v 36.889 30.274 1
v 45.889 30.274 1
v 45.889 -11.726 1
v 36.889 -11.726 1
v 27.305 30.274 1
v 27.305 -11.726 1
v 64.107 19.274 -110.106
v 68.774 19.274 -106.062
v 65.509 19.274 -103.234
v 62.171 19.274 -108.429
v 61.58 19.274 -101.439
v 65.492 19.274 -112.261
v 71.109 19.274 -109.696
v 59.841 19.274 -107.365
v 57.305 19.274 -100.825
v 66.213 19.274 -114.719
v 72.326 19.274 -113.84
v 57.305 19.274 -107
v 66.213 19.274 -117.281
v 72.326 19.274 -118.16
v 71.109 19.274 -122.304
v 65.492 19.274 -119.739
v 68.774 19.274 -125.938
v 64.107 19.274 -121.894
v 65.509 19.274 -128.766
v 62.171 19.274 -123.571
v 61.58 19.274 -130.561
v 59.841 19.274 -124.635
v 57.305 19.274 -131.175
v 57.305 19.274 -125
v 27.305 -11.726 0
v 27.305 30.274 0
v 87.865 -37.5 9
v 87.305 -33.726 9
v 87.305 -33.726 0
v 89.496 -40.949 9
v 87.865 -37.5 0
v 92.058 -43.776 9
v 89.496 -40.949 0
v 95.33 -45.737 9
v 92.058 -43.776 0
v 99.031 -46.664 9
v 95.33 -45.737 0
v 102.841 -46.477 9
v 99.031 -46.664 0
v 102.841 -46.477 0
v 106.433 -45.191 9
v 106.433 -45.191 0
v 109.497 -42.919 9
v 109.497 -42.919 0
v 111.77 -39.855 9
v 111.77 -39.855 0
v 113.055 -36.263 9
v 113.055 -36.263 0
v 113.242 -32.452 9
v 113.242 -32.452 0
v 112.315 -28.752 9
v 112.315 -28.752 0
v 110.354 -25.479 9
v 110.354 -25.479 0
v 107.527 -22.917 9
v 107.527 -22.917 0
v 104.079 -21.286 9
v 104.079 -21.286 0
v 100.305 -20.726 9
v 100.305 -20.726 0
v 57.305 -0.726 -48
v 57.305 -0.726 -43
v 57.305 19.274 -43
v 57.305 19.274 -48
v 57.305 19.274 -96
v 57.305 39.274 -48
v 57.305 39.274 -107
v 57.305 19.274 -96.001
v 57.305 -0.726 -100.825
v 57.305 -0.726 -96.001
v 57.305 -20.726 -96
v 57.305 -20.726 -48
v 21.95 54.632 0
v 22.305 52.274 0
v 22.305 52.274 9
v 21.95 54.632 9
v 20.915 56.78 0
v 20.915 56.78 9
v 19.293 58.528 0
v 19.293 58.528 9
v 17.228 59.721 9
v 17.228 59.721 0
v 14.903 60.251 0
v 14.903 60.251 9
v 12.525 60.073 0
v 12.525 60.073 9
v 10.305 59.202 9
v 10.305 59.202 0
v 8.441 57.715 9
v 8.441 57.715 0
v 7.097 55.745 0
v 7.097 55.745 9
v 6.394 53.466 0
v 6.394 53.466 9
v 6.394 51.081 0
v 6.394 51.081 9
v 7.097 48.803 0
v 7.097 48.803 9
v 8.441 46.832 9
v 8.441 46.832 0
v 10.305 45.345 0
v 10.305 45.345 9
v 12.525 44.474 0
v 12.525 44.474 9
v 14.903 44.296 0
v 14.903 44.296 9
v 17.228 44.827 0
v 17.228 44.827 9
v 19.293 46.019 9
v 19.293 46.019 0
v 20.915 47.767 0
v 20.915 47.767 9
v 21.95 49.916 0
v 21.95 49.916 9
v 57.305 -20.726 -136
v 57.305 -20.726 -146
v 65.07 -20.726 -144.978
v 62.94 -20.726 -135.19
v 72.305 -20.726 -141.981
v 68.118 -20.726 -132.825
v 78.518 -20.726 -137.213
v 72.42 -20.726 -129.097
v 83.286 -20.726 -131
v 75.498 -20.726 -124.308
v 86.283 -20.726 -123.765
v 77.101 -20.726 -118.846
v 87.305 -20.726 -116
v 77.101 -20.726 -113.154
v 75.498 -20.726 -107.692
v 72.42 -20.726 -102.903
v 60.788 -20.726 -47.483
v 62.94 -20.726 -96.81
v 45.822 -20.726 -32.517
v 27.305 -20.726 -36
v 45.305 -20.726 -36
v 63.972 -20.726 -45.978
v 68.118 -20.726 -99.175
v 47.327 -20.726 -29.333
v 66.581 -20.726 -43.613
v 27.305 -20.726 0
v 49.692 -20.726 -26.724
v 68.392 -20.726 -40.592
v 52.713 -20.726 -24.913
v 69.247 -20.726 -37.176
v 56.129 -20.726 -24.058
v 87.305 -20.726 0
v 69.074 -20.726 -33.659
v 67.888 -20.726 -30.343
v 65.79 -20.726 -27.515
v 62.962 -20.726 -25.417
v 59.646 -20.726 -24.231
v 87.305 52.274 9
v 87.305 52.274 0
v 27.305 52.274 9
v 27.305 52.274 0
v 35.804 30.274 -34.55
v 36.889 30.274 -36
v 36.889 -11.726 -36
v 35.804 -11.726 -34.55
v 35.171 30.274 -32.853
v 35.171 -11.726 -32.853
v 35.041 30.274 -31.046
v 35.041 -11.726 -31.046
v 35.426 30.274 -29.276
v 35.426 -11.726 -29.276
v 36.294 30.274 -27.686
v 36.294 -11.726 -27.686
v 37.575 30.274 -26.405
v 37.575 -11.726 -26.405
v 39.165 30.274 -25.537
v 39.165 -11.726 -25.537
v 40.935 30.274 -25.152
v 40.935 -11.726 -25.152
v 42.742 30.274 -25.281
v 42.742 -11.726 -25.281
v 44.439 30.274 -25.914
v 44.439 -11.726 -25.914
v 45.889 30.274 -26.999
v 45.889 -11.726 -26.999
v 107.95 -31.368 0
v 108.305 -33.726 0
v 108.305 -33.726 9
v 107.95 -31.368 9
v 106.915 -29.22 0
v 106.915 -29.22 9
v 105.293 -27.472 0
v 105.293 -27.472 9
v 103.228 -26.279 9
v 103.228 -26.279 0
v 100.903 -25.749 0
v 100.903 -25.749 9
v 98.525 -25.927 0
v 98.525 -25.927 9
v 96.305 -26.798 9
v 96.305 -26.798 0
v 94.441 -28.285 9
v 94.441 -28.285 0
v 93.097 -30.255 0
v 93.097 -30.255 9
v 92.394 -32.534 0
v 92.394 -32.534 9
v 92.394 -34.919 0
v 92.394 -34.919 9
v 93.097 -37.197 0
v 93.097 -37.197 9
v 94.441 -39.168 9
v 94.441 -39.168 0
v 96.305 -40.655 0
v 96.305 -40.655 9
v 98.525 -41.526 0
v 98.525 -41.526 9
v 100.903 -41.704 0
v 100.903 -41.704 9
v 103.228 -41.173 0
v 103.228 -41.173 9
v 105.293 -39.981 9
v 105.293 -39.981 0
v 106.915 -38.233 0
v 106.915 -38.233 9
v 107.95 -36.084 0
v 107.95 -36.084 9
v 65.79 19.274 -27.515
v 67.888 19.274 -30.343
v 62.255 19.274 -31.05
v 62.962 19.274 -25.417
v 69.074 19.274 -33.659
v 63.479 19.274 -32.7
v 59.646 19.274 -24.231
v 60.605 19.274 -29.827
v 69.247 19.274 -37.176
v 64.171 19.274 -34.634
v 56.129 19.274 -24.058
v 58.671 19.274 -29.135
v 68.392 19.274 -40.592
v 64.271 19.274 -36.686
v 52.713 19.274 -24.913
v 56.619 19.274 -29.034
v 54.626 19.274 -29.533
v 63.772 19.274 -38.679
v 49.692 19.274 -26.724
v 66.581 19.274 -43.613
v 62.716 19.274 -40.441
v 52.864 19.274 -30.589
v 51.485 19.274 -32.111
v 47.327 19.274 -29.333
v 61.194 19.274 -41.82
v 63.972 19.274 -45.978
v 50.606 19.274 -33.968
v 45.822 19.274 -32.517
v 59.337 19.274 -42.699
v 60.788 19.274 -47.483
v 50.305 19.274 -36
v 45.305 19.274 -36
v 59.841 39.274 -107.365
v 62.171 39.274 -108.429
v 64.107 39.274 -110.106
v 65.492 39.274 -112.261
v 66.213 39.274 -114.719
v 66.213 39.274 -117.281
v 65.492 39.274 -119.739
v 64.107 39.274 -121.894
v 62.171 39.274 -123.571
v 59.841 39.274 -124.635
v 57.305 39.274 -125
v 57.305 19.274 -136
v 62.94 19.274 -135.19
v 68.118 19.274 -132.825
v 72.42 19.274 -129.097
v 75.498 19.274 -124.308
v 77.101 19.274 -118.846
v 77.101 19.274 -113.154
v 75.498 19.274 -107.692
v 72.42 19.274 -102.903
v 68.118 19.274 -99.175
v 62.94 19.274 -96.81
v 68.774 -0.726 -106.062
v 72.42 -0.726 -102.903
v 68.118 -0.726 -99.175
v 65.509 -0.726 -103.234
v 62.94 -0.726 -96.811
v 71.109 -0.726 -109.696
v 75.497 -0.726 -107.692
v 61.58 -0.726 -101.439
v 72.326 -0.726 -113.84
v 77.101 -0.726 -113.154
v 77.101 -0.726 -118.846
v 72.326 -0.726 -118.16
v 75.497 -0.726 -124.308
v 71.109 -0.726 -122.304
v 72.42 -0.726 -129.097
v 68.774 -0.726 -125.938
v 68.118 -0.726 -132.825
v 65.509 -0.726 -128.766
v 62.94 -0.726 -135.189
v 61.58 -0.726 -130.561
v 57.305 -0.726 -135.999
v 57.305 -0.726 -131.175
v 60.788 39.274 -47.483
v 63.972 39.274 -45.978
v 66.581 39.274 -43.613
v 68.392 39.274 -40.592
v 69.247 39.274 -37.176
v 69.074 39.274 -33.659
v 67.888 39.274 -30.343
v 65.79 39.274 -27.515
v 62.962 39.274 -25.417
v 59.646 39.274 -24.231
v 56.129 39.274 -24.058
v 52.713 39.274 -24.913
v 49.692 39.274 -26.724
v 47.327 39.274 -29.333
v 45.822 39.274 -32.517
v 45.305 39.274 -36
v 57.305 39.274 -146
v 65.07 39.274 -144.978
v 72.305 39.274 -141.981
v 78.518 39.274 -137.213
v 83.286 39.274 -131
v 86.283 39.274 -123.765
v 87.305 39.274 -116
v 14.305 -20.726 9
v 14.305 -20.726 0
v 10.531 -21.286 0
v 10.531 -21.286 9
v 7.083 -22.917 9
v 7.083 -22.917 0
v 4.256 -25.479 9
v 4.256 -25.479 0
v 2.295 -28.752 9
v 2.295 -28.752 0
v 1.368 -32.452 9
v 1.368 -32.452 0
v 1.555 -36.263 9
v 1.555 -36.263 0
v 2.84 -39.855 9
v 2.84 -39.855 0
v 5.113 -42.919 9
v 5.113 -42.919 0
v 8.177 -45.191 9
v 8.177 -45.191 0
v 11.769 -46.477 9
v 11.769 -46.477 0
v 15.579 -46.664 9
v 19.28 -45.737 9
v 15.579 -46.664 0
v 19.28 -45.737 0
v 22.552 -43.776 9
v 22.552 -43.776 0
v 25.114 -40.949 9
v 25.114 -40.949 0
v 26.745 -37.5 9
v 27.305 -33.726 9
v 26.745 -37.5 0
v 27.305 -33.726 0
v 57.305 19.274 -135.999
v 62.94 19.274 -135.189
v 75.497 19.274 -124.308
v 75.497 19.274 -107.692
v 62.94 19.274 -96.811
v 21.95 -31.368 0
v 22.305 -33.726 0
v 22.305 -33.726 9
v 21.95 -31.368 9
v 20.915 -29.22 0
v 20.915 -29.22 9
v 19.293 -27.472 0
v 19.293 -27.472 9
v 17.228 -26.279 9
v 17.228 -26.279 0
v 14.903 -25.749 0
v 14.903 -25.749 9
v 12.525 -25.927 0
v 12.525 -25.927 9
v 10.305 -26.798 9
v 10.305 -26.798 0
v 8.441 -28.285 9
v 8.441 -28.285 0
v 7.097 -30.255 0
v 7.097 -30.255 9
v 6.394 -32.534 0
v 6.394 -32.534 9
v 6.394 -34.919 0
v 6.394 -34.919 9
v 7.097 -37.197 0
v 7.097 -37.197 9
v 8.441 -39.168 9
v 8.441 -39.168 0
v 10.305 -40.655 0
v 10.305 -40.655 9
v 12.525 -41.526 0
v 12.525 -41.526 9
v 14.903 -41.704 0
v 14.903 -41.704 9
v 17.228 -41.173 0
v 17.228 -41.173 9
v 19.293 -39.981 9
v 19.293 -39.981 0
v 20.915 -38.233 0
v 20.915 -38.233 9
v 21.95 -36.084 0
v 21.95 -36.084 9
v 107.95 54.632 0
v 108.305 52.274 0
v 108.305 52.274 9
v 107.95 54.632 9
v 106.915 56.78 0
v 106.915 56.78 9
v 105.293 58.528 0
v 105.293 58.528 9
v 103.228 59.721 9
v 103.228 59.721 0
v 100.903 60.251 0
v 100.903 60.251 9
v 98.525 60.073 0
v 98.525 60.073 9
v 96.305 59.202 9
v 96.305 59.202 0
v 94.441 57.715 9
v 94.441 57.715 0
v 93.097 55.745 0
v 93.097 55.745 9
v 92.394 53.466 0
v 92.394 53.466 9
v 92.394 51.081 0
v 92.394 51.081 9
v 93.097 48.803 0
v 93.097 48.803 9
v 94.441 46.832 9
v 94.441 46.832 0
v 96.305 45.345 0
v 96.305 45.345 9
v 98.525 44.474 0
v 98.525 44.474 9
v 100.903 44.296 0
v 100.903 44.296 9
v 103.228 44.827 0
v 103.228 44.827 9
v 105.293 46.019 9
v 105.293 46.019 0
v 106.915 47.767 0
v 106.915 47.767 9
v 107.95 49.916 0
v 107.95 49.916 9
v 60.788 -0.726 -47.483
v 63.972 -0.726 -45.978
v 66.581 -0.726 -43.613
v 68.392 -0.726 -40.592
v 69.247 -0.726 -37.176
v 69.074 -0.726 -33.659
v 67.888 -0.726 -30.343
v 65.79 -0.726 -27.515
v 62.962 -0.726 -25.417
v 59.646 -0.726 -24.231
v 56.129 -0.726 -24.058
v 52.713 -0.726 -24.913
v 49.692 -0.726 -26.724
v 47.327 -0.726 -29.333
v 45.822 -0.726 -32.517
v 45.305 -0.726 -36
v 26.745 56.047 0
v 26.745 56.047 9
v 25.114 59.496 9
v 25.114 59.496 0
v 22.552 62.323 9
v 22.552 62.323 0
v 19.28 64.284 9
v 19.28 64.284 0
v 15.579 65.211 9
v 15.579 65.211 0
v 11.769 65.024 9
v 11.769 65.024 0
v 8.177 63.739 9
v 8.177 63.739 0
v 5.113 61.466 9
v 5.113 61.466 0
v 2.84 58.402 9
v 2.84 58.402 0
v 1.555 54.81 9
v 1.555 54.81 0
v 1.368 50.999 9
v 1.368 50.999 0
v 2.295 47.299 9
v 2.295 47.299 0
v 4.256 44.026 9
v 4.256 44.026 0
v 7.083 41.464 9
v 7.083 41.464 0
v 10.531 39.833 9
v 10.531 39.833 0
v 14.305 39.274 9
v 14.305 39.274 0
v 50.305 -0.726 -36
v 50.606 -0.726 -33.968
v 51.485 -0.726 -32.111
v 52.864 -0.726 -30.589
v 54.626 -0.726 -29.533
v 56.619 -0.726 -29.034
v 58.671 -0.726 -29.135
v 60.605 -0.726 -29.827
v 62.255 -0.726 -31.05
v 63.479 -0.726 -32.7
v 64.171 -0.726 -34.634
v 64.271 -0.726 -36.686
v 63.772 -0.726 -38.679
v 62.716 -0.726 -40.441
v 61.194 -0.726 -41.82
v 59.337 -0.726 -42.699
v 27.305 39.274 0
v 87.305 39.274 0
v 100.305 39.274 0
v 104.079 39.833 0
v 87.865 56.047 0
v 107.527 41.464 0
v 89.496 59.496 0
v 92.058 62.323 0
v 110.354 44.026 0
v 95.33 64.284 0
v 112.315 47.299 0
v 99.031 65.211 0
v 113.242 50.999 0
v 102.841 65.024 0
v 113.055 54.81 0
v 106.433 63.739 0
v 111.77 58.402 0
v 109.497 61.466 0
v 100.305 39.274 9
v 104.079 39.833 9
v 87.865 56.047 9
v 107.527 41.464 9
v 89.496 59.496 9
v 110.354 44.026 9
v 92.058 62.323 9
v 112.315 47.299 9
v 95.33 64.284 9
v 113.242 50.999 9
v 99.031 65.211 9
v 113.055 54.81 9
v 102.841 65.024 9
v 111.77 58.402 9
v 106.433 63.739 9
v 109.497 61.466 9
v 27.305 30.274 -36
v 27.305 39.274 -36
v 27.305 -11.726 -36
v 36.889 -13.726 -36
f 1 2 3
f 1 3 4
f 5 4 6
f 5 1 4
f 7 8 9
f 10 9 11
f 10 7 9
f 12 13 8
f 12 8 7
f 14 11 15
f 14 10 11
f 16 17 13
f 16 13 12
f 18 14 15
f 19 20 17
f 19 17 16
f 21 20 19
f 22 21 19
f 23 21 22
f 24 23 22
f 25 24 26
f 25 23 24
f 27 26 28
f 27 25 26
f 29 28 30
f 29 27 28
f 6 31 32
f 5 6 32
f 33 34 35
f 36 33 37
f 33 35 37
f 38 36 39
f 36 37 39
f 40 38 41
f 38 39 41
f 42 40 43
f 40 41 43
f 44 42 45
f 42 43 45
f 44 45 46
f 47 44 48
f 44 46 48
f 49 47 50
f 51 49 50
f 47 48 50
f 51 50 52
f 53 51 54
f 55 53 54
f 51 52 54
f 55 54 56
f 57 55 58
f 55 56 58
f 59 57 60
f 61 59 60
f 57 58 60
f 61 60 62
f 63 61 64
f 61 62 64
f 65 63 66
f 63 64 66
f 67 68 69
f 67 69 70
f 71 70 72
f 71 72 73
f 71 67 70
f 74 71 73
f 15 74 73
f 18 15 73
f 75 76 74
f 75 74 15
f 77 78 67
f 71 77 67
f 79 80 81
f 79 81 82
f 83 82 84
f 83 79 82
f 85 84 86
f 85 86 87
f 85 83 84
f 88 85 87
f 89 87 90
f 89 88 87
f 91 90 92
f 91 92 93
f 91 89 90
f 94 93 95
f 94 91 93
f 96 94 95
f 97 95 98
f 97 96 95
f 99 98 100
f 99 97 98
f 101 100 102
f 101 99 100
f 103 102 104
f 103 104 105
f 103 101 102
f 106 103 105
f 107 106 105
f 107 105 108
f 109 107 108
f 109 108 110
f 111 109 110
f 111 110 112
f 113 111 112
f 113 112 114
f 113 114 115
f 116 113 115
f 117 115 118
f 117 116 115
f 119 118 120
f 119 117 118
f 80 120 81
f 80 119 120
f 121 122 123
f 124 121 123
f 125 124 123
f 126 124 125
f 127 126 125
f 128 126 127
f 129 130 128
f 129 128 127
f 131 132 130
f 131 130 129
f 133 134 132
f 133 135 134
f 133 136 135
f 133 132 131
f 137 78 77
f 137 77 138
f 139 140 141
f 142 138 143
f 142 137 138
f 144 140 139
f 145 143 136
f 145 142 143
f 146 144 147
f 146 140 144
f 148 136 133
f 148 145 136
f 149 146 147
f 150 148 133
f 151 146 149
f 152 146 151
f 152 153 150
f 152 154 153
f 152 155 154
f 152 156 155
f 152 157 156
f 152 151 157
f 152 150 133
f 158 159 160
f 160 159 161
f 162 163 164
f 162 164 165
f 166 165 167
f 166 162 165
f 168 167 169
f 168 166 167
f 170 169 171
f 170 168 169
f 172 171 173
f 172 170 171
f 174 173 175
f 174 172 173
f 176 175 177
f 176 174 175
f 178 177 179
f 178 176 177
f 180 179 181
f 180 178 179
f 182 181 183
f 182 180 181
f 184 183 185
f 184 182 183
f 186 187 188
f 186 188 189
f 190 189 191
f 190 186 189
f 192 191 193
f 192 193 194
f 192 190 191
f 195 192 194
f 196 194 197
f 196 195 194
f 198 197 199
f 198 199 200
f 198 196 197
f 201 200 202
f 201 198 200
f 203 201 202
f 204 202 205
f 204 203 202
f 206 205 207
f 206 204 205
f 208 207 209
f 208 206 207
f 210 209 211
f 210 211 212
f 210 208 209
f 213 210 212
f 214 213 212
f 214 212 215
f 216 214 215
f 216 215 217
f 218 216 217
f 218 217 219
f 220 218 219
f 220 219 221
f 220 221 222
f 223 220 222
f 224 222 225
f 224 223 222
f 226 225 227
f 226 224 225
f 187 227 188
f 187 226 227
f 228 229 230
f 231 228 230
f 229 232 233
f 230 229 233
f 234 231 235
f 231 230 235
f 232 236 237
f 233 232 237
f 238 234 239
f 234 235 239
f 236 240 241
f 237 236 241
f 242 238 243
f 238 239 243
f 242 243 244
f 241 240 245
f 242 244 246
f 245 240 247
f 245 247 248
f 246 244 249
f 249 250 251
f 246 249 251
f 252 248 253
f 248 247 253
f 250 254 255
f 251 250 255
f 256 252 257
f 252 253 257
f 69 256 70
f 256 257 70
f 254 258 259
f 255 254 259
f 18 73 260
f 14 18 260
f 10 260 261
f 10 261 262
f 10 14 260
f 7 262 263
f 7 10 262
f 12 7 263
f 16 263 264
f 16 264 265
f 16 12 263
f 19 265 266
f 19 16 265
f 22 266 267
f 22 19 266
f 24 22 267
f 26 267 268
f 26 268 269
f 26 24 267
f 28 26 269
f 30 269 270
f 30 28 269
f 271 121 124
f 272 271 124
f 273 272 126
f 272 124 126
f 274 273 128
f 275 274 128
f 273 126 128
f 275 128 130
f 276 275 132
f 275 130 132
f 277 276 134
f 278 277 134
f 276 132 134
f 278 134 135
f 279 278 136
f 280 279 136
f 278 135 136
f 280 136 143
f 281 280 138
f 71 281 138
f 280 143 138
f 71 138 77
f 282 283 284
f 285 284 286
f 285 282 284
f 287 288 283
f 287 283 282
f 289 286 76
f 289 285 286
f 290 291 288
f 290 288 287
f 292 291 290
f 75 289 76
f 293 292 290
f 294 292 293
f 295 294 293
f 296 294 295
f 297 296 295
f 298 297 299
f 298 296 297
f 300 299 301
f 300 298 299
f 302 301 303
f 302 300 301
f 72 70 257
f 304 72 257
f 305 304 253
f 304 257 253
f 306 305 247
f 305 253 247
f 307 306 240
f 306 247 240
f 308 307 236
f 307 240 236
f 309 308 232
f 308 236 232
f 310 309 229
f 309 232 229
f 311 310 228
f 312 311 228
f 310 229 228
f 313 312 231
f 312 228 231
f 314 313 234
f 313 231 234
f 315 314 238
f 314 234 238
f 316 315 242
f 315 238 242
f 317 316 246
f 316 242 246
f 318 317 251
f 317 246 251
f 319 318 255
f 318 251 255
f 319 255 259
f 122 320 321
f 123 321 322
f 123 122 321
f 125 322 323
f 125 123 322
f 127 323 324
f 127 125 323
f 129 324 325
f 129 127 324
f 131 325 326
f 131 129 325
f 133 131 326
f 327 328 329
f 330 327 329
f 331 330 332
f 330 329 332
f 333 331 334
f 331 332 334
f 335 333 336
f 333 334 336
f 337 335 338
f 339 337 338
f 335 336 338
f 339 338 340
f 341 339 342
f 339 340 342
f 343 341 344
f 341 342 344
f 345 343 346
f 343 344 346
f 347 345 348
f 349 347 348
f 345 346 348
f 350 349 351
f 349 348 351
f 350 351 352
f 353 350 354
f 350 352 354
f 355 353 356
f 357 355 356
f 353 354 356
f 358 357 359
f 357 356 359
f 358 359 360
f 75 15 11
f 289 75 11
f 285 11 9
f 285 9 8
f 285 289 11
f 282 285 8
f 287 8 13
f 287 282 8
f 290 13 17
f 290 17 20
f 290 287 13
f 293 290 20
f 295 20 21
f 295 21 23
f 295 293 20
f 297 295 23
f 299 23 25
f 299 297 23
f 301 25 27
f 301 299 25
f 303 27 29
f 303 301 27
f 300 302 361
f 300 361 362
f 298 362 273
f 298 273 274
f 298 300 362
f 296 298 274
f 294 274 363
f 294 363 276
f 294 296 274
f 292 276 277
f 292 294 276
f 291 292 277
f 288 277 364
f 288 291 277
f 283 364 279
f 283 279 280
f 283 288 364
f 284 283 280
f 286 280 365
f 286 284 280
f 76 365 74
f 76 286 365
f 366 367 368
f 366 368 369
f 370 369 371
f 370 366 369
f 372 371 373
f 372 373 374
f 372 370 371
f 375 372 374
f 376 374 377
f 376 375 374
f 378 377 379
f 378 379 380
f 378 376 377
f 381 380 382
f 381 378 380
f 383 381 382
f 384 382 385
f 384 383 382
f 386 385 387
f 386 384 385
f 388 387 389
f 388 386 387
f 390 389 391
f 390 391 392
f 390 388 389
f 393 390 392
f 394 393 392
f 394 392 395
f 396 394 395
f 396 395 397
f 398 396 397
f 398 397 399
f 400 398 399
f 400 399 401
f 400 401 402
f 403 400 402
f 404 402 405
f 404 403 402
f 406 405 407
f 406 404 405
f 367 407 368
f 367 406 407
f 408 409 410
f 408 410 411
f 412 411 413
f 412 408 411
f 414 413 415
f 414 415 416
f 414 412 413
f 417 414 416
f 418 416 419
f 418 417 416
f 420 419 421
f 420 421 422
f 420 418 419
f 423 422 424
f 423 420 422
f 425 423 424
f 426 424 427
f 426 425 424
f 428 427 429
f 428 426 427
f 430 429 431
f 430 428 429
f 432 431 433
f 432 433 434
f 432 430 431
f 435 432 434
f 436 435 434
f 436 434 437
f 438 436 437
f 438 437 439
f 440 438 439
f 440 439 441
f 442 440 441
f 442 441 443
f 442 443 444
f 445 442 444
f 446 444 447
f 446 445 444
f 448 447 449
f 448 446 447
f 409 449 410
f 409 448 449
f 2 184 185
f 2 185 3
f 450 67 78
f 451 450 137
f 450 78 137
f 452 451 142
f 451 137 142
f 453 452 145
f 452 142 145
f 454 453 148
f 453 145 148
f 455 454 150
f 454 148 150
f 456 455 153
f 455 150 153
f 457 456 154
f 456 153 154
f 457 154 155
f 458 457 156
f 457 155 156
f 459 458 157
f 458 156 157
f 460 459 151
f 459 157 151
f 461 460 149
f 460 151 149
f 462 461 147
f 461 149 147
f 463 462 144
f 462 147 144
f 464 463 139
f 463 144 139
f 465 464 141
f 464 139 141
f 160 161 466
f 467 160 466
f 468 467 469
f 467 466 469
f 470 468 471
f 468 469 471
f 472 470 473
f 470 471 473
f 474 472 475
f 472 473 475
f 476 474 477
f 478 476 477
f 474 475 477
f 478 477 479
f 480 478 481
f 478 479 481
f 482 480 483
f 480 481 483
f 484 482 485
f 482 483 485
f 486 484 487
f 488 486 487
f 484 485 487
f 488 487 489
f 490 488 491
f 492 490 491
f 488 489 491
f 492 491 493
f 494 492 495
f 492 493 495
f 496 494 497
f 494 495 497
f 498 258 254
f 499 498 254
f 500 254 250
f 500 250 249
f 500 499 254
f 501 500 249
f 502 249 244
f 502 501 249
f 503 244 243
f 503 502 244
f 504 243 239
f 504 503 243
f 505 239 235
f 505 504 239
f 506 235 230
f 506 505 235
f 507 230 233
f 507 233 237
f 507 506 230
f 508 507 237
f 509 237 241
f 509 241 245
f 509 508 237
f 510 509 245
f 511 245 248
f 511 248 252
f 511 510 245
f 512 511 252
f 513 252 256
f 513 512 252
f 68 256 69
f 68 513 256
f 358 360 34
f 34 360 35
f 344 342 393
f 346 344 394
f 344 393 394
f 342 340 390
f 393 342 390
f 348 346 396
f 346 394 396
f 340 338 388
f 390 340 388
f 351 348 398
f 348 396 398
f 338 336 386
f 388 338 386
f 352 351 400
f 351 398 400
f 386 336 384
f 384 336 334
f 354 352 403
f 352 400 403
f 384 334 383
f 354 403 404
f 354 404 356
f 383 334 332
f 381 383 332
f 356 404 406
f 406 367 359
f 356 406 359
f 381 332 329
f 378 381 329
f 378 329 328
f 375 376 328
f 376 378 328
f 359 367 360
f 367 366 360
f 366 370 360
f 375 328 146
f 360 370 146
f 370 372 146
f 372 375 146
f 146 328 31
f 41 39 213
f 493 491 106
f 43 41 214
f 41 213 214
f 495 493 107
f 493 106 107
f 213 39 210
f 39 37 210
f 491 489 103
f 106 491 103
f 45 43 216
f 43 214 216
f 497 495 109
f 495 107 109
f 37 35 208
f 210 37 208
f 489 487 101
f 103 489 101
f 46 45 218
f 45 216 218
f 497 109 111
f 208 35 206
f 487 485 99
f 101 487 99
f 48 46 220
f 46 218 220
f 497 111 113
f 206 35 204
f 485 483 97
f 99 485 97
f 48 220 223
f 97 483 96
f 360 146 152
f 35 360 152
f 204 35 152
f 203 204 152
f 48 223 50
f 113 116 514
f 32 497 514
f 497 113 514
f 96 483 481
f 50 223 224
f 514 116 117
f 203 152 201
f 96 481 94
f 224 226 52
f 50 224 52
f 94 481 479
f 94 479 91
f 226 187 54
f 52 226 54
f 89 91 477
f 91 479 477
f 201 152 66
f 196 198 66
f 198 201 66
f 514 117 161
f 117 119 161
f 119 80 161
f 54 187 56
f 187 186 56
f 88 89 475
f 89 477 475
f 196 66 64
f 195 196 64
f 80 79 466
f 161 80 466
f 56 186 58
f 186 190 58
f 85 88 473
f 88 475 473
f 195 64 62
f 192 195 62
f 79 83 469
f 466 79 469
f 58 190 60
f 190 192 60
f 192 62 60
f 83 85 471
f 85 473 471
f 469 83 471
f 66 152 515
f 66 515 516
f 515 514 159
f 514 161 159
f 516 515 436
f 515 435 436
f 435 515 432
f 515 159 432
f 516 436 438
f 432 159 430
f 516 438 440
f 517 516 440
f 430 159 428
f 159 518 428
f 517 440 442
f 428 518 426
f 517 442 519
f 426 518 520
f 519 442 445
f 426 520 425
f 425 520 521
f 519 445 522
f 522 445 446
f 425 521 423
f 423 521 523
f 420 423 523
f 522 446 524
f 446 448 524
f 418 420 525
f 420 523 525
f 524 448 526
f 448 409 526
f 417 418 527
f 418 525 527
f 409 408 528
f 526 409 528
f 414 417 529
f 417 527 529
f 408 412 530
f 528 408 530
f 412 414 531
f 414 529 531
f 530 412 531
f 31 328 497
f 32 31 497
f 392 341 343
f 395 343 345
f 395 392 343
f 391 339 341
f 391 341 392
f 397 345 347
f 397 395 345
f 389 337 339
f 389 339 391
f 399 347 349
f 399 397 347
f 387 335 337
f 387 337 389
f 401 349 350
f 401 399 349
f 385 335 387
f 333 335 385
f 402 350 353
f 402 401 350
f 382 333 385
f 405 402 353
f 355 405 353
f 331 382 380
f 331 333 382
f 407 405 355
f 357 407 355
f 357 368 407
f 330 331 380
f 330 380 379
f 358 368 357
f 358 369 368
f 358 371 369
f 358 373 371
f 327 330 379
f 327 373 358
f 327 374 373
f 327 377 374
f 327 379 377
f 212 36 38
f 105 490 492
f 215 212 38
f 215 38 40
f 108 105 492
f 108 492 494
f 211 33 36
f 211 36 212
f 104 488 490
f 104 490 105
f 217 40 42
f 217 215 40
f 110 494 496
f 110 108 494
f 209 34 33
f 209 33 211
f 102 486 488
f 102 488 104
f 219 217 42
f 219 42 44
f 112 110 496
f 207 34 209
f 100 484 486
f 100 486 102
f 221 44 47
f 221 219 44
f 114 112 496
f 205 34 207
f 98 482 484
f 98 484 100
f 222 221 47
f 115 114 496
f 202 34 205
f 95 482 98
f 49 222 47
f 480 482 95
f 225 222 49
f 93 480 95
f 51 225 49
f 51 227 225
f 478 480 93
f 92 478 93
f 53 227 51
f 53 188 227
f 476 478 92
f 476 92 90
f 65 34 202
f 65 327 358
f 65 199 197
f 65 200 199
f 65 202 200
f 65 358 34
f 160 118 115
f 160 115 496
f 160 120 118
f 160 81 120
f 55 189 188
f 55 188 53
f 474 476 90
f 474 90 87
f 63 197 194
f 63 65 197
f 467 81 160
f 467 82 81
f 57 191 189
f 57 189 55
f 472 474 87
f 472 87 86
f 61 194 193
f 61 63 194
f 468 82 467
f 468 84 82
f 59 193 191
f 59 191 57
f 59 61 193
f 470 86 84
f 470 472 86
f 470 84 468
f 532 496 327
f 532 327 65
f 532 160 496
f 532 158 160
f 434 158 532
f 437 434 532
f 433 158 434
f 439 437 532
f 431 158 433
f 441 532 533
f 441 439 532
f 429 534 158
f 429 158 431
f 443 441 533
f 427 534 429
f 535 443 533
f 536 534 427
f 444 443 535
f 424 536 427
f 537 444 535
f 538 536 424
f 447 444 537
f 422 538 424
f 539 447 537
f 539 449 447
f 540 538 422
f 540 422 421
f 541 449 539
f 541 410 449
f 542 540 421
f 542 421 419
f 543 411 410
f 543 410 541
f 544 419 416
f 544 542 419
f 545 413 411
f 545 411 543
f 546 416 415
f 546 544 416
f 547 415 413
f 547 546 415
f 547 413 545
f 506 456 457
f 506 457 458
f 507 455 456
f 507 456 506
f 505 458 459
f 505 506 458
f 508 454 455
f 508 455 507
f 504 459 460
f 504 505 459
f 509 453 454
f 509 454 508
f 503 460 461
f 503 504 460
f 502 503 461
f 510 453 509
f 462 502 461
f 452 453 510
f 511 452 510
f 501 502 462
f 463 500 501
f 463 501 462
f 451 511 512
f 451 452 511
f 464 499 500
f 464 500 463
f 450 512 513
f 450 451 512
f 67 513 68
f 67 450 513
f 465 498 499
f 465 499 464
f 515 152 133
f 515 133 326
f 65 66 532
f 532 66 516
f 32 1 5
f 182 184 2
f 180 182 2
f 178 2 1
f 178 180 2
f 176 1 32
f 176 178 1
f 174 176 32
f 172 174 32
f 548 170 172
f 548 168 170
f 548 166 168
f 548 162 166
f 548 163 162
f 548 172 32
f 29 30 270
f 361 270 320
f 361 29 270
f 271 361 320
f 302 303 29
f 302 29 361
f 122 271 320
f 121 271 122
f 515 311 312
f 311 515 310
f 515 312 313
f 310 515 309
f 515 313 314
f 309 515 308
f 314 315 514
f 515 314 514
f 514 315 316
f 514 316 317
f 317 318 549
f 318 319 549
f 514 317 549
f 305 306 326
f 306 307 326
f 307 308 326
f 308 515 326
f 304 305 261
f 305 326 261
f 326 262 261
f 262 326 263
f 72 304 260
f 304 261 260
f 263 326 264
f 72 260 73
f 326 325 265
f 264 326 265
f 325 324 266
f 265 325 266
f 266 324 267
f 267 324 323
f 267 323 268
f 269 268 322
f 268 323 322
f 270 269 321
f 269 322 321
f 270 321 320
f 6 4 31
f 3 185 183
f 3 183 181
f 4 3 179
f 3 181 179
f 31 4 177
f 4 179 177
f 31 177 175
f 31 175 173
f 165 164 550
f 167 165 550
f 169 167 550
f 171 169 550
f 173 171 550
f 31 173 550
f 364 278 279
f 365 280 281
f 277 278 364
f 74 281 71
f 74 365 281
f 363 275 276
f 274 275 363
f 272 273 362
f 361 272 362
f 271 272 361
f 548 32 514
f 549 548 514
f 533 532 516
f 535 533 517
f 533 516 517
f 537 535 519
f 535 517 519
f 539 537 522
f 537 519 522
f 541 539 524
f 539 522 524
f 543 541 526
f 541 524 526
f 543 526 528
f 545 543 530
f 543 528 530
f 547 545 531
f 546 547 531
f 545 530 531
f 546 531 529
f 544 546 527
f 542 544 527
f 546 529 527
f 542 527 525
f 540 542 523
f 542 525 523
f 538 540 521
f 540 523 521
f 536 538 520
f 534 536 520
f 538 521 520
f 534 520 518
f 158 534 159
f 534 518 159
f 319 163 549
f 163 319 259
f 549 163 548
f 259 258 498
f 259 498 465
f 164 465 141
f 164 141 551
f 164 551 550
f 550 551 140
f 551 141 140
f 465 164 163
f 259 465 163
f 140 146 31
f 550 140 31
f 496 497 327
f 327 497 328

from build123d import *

# Parameters (mm, degrees)
IZIM1_R                     = 13
IZIM1_R_2                   = 8
Y_KSEKLIK_EKSTR_ZYON2_DEPTH = 9
IZIM2_W                     = 60
IZIM2_H                     = 60
Y_KSEKLIK_EKSTR_ZYON3_DEPTH = 116
Y_KSEKLIK_EKSTR_ZYON4_DEPTH = 60
IZIM4_R                     = 20
KES_EKSTR_ZYON2_DEPTH       = 220
IZIM5_R                     = 12
KES_EKSTR_ZYON3_DEPTH       = 220
KES_EKSTR_ZYON4_DEPTH       = 220
Y_KSEKLIK_EKSTR_ZYON6_DEPTH = 20
Y_KSEKLIK_EKSTR_ZYON7_DEPTH = 20
Y_KSEKLIK_EKSTR_ZYON8_DEPTH = 20
IZIM12_W                    = 9.584184826
IZIM12_H                    = 42
KES_EKSTR_ZYON5_DEPTH       = 37
IZIM13_W                    = 27.999362569
IZIM13_H                    = 42
KES_EKSTR_ZYON6_DEPTH       = 9
Y_KSEKLIK_EKSTR_ZYON9_DEPTH = 44


with BuildPart() as part:
    # Çizim1 → Yükseklik-Ekstrüzyon2 (new body)
    # profile 1 of 5: a face of its own
    with BuildSketch(Plane.XY):
        with Locations((14.305057501, -33.726417094)):
            Circle(IZIM1_R)
        with Locations((14.305057501, -33.726417094)):
            Circle(IZIM1_R_2, mode=Mode.SUBTRACT)
    # profile 2 of 5: a face of its own
    with BuildSketch(Plane.XY):
        with BuildLine():
            ThreePointArc((14.305057501, -20.726417094), (23.497445657, -24.534028939), (27.305057501, -33.726417094))
            Line((27.305057501, -33.726417094), (87.305057501, -33.726417094))
            ThreePointArc((87.305057501, -33.726417094), (91.112669346, -24.534028939), (100.305057501, -20.726417094))
            Line((100.305057501, -20.726417094), (100.305057501, 39.273582906))
            ThreePointArc((100.305057501, 39.273582906), (91.112669346, 43.08119475), (87.305057501, 52.273582906))
            Line((87.305057501, 52.273582906), (27.305057501, 52.273582906))
            ThreePointArc((27.305057501, 52.273582906), (23.497445657, 43.08119475), (14.305057501, 39.273582906))
            Line((14.305057501, 39.273582906), (14.305057501, -20.726417094))
        make_face()
    # profile 3 of 5: a face of its own
    with BuildSketch(Plane.XY):
        with Locations((100.305057501, -33.726417094)):
            Circle(IZIM1_R)
        with Locations((100.305057501, -33.726417094)):
            Circle(IZIM1_R_2, mode=Mode.SUBTRACT)
    # profile 4 of 5: a face of its own
    with BuildSketch(Plane.XY):
        with Locations((100.305057501, 52.273582906)):
            Circle(IZIM1_R)
        with Locations((100.305057501, 52.273582906)):
            Circle(IZIM1_R_2, mode=Mode.SUBTRACT)
    # profile 5 of 5: a face of its own
    with BuildSketch(Plane.XY):
        with Locations((14.305057501, 52.273582906)):
            Circle(IZIM1_R)
        with Locations((14.305057501, 52.273582906)):
            Circle(IZIM1_R_2, mode=Mode.SUBTRACT)
    extrude(amount=Y_KSEKLIK_EKSTR_ZYON2_DEPTH)

    # Çizim2 → Yükseklik-Ekstrüzyon3 (add)
    with BuildSketch(Plane(origin=(0, 0, 0), x_dir=(-1, 0, 0), z_dir=(0, 0, -1))):
        with Locations((-57.305057501, 9.273582906)):
            Rectangle(IZIM2_W, IZIM2_H)
    extrude(amount=Y_KSEKLIK_EKSTR_ZYON3_DEPTH)

    # Çizim3 → Yükseklik-Ekstrüzyon4 (add)
    with BuildSketch(Plane.XZ.offset(20.726417094)):
        with BuildLine():
            ThreePointArc((27.305057501, -116), (57.305057501, -146), (87.305057501, -116))
            Line((87.305057501, -116), (67.305057501, -116))
            ThreePointArc((67.305057501, -116), (57.305057501, -126), (47.305057501, -116))
            Line((47.305057501, -116), (27.305057501, -116))
        make_face()
    extrude(amount=-Y_KSEKLIK_EKSTR_ZYON4_DEPTH)

    # Çizim4 → Kes-Ekstrüzyon2 (cut)
    with BuildSketch(Plane.XZ.offset(20.726417094)):
        with Locations(Location((57.305057501, -116, 0), (0, 0, 270))):
            Circle(IZIM4_R)
    extrude(amount=-KES_EKSTR_ZYON2_DEPTH, mode=Mode.SUBTRACT)

    # Çizim5 → Kes-Ekstrüzyon3 (cut)
    with BuildSketch(Plane.XZ.offset(20.726417094)):
        with Locations(Location((57.305057501, -36, 0), (0, 0, 270))):
            Circle(IZIM5_R)
    extrude(amount=-KES_EKSTR_ZYON3_DEPTH, mode=Mode.SUBTRACT)

    # Çizim6 → Kes-Ekstrüzyon4 (cut)
    with BuildSketch(Plane(origin=(0, -20.726417094, 0), x_dir=(-1, 0, 0), z_dir=(0, -1, 0))):
        with BuildLine():
            ThreePointArc((-27.305057501, 116), (-36.091854066, 137.213203436), (-57.305057501, 146))
            Line((-57.305057501, 146), (-57.305057501, 136))
            ThreePointArc((-57.305057501, 136), (-43.162921878, 130.142135624), (-37.305057501, 116))
            ThreePointArc((-37.305057501, 116), (-43.162921878, 101.857864376), (-57.305057501, 96))
            Line((-57.305057501, 96), (-57.305057501, 48))
            ThreePointArc((-57.305057501, 48), (-48.819776127, 44.485281374), (-45.305057501, 36))
            Line((-45.305057501, 36), (-27.305057501, 36))
            Line((-27.305057501, 36), (-27.305057501, 116))
        make_face()
    extrude(amount=-KES_EKSTR_ZYON4_DEPTH, mode=Mode.SUBTRACT)



with BuildPart() as body_2:
    # Çizim7 → Yükseklik-Ekstrüzyon6 (new body)
    with BuildSketch(Plane(origin=(0, -0.726417094, 0), x_dir=(-1, 0, 0), z_dir=(0, -1, 0))):
        with BuildLine():
            Line((-57.305057501, 131.175251222), (-57.305057501, 135.999344695))
            ThreePointArc((-57.305057501, 135.999344695), (-77.304402197, 116), (-57.305057501, 96.000655305))
            Line((-57.305057501, 96.000655305), (-57.305057501, 100.824748778))
            ThreePointArc((-57.305057501, 100.824748778), (-72.480308724, 116), (-57.305057501, 131.175251222))
        make_face()
    extrude(amount=-Y_KSEKLIK_EKSTR_ZYON6_DEPTH)


with BuildPart() as part_1:
    add(part.part)

    add(body_2.part)  # Yükseklik-Ekstrüzyon7 merges body 2
    # Çizim10 → Yükseklik-Ekstrüzyon7 (add)
    with BuildSketch(Plane(origin=(0, 19.273582906, 0), x_dir=(-1, 0, 0), z_dir=(0, -1, 0))):
        with BuildLine():
            Line((-57.305057501, 96), (-57.305057501, 107))
            ThreePointArc((-57.305057501, 107), (-66.305057501, 116), (-57.305057501, 125))
            Line((-57.305057501, 125), (-57.305057501, 136))
            ThreePointArc((-57.305057501, 136), (-77.305057501, 116), (-57.305057501, 96))
        make_face()
    extrude(amount=-Y_KSEKLIK_EKSTR_ZYON7_DEPTH)

    # Çizim11 → Yükseklik-Ekstrüzyon8 (add)
    with BuildSketch(Plane(origin=(0, -0.726417094, 0), x_dir=(-1, 0, 0), z_dir=(0, -1, 0))):
        with BuildLine():
            Line((-57.305057501, 43), (-57.305057501, 48))
            ThreePointArc((-57.305057501, 48), (-65.790338876, 27.514718626), (-45.305057501, 36))
            Line((-45.305057501, 36), (-50.305057501, 36))
            ThreePointArc((-50.305057501, 36), (-62.25480497, 31.050252532), (-57.305057501, 43))
        make_face()
    extrude(amount=-Y_KSEKLIK_EKSTR_ZYON8_DEPTH)

    # Çizim12 → Kes-Ekstrüzyon5 (cut)
    with BuildSketch(Plane(origin=(0, 0, -36), x_dir=(-1, 0, 0), z_dir=(0, 0, -1))):
        with Locations((-32.097149914, 9.273582906)):
            Rectangle(IZIM12_W, IZIM12_H)
    extrude(amount=-KES_EKSTR_ZYON5_DEPTH, mode=Mode.SUBTRACT)

    # Çizim13 → Kes-Ekstrüzyon6 (cut)
    with BuildSketch(Plane.ZY.offset(-36.889242327)):
        with Locations((-12.999681285, 9.273582906)):
            Rectangle(IZIM13_W, IZIM13_H)
    extrude(amount=-KES_EKSTR_ZYON6_DEPTH, mode=Mode.SUBTRACT)

    # Çizim15 → Yükseklik-Ekstrüzyon9 (add)
    with BuildSketch(Plane.XZ.offset(-30.273582906)):
        with BuildLine():
            Line((45.889242327, -26.999362569), (36.889242327, -36))
            ThreePointArc((36.889242327, -36), (36.888923612, -26.999681284), (45.889242327, -26.999362569))
        make_face()
    extrude(amount=Y_KSEKLIK_EKSTR_ZYON9_DEPTH)


solid = part_1.part
